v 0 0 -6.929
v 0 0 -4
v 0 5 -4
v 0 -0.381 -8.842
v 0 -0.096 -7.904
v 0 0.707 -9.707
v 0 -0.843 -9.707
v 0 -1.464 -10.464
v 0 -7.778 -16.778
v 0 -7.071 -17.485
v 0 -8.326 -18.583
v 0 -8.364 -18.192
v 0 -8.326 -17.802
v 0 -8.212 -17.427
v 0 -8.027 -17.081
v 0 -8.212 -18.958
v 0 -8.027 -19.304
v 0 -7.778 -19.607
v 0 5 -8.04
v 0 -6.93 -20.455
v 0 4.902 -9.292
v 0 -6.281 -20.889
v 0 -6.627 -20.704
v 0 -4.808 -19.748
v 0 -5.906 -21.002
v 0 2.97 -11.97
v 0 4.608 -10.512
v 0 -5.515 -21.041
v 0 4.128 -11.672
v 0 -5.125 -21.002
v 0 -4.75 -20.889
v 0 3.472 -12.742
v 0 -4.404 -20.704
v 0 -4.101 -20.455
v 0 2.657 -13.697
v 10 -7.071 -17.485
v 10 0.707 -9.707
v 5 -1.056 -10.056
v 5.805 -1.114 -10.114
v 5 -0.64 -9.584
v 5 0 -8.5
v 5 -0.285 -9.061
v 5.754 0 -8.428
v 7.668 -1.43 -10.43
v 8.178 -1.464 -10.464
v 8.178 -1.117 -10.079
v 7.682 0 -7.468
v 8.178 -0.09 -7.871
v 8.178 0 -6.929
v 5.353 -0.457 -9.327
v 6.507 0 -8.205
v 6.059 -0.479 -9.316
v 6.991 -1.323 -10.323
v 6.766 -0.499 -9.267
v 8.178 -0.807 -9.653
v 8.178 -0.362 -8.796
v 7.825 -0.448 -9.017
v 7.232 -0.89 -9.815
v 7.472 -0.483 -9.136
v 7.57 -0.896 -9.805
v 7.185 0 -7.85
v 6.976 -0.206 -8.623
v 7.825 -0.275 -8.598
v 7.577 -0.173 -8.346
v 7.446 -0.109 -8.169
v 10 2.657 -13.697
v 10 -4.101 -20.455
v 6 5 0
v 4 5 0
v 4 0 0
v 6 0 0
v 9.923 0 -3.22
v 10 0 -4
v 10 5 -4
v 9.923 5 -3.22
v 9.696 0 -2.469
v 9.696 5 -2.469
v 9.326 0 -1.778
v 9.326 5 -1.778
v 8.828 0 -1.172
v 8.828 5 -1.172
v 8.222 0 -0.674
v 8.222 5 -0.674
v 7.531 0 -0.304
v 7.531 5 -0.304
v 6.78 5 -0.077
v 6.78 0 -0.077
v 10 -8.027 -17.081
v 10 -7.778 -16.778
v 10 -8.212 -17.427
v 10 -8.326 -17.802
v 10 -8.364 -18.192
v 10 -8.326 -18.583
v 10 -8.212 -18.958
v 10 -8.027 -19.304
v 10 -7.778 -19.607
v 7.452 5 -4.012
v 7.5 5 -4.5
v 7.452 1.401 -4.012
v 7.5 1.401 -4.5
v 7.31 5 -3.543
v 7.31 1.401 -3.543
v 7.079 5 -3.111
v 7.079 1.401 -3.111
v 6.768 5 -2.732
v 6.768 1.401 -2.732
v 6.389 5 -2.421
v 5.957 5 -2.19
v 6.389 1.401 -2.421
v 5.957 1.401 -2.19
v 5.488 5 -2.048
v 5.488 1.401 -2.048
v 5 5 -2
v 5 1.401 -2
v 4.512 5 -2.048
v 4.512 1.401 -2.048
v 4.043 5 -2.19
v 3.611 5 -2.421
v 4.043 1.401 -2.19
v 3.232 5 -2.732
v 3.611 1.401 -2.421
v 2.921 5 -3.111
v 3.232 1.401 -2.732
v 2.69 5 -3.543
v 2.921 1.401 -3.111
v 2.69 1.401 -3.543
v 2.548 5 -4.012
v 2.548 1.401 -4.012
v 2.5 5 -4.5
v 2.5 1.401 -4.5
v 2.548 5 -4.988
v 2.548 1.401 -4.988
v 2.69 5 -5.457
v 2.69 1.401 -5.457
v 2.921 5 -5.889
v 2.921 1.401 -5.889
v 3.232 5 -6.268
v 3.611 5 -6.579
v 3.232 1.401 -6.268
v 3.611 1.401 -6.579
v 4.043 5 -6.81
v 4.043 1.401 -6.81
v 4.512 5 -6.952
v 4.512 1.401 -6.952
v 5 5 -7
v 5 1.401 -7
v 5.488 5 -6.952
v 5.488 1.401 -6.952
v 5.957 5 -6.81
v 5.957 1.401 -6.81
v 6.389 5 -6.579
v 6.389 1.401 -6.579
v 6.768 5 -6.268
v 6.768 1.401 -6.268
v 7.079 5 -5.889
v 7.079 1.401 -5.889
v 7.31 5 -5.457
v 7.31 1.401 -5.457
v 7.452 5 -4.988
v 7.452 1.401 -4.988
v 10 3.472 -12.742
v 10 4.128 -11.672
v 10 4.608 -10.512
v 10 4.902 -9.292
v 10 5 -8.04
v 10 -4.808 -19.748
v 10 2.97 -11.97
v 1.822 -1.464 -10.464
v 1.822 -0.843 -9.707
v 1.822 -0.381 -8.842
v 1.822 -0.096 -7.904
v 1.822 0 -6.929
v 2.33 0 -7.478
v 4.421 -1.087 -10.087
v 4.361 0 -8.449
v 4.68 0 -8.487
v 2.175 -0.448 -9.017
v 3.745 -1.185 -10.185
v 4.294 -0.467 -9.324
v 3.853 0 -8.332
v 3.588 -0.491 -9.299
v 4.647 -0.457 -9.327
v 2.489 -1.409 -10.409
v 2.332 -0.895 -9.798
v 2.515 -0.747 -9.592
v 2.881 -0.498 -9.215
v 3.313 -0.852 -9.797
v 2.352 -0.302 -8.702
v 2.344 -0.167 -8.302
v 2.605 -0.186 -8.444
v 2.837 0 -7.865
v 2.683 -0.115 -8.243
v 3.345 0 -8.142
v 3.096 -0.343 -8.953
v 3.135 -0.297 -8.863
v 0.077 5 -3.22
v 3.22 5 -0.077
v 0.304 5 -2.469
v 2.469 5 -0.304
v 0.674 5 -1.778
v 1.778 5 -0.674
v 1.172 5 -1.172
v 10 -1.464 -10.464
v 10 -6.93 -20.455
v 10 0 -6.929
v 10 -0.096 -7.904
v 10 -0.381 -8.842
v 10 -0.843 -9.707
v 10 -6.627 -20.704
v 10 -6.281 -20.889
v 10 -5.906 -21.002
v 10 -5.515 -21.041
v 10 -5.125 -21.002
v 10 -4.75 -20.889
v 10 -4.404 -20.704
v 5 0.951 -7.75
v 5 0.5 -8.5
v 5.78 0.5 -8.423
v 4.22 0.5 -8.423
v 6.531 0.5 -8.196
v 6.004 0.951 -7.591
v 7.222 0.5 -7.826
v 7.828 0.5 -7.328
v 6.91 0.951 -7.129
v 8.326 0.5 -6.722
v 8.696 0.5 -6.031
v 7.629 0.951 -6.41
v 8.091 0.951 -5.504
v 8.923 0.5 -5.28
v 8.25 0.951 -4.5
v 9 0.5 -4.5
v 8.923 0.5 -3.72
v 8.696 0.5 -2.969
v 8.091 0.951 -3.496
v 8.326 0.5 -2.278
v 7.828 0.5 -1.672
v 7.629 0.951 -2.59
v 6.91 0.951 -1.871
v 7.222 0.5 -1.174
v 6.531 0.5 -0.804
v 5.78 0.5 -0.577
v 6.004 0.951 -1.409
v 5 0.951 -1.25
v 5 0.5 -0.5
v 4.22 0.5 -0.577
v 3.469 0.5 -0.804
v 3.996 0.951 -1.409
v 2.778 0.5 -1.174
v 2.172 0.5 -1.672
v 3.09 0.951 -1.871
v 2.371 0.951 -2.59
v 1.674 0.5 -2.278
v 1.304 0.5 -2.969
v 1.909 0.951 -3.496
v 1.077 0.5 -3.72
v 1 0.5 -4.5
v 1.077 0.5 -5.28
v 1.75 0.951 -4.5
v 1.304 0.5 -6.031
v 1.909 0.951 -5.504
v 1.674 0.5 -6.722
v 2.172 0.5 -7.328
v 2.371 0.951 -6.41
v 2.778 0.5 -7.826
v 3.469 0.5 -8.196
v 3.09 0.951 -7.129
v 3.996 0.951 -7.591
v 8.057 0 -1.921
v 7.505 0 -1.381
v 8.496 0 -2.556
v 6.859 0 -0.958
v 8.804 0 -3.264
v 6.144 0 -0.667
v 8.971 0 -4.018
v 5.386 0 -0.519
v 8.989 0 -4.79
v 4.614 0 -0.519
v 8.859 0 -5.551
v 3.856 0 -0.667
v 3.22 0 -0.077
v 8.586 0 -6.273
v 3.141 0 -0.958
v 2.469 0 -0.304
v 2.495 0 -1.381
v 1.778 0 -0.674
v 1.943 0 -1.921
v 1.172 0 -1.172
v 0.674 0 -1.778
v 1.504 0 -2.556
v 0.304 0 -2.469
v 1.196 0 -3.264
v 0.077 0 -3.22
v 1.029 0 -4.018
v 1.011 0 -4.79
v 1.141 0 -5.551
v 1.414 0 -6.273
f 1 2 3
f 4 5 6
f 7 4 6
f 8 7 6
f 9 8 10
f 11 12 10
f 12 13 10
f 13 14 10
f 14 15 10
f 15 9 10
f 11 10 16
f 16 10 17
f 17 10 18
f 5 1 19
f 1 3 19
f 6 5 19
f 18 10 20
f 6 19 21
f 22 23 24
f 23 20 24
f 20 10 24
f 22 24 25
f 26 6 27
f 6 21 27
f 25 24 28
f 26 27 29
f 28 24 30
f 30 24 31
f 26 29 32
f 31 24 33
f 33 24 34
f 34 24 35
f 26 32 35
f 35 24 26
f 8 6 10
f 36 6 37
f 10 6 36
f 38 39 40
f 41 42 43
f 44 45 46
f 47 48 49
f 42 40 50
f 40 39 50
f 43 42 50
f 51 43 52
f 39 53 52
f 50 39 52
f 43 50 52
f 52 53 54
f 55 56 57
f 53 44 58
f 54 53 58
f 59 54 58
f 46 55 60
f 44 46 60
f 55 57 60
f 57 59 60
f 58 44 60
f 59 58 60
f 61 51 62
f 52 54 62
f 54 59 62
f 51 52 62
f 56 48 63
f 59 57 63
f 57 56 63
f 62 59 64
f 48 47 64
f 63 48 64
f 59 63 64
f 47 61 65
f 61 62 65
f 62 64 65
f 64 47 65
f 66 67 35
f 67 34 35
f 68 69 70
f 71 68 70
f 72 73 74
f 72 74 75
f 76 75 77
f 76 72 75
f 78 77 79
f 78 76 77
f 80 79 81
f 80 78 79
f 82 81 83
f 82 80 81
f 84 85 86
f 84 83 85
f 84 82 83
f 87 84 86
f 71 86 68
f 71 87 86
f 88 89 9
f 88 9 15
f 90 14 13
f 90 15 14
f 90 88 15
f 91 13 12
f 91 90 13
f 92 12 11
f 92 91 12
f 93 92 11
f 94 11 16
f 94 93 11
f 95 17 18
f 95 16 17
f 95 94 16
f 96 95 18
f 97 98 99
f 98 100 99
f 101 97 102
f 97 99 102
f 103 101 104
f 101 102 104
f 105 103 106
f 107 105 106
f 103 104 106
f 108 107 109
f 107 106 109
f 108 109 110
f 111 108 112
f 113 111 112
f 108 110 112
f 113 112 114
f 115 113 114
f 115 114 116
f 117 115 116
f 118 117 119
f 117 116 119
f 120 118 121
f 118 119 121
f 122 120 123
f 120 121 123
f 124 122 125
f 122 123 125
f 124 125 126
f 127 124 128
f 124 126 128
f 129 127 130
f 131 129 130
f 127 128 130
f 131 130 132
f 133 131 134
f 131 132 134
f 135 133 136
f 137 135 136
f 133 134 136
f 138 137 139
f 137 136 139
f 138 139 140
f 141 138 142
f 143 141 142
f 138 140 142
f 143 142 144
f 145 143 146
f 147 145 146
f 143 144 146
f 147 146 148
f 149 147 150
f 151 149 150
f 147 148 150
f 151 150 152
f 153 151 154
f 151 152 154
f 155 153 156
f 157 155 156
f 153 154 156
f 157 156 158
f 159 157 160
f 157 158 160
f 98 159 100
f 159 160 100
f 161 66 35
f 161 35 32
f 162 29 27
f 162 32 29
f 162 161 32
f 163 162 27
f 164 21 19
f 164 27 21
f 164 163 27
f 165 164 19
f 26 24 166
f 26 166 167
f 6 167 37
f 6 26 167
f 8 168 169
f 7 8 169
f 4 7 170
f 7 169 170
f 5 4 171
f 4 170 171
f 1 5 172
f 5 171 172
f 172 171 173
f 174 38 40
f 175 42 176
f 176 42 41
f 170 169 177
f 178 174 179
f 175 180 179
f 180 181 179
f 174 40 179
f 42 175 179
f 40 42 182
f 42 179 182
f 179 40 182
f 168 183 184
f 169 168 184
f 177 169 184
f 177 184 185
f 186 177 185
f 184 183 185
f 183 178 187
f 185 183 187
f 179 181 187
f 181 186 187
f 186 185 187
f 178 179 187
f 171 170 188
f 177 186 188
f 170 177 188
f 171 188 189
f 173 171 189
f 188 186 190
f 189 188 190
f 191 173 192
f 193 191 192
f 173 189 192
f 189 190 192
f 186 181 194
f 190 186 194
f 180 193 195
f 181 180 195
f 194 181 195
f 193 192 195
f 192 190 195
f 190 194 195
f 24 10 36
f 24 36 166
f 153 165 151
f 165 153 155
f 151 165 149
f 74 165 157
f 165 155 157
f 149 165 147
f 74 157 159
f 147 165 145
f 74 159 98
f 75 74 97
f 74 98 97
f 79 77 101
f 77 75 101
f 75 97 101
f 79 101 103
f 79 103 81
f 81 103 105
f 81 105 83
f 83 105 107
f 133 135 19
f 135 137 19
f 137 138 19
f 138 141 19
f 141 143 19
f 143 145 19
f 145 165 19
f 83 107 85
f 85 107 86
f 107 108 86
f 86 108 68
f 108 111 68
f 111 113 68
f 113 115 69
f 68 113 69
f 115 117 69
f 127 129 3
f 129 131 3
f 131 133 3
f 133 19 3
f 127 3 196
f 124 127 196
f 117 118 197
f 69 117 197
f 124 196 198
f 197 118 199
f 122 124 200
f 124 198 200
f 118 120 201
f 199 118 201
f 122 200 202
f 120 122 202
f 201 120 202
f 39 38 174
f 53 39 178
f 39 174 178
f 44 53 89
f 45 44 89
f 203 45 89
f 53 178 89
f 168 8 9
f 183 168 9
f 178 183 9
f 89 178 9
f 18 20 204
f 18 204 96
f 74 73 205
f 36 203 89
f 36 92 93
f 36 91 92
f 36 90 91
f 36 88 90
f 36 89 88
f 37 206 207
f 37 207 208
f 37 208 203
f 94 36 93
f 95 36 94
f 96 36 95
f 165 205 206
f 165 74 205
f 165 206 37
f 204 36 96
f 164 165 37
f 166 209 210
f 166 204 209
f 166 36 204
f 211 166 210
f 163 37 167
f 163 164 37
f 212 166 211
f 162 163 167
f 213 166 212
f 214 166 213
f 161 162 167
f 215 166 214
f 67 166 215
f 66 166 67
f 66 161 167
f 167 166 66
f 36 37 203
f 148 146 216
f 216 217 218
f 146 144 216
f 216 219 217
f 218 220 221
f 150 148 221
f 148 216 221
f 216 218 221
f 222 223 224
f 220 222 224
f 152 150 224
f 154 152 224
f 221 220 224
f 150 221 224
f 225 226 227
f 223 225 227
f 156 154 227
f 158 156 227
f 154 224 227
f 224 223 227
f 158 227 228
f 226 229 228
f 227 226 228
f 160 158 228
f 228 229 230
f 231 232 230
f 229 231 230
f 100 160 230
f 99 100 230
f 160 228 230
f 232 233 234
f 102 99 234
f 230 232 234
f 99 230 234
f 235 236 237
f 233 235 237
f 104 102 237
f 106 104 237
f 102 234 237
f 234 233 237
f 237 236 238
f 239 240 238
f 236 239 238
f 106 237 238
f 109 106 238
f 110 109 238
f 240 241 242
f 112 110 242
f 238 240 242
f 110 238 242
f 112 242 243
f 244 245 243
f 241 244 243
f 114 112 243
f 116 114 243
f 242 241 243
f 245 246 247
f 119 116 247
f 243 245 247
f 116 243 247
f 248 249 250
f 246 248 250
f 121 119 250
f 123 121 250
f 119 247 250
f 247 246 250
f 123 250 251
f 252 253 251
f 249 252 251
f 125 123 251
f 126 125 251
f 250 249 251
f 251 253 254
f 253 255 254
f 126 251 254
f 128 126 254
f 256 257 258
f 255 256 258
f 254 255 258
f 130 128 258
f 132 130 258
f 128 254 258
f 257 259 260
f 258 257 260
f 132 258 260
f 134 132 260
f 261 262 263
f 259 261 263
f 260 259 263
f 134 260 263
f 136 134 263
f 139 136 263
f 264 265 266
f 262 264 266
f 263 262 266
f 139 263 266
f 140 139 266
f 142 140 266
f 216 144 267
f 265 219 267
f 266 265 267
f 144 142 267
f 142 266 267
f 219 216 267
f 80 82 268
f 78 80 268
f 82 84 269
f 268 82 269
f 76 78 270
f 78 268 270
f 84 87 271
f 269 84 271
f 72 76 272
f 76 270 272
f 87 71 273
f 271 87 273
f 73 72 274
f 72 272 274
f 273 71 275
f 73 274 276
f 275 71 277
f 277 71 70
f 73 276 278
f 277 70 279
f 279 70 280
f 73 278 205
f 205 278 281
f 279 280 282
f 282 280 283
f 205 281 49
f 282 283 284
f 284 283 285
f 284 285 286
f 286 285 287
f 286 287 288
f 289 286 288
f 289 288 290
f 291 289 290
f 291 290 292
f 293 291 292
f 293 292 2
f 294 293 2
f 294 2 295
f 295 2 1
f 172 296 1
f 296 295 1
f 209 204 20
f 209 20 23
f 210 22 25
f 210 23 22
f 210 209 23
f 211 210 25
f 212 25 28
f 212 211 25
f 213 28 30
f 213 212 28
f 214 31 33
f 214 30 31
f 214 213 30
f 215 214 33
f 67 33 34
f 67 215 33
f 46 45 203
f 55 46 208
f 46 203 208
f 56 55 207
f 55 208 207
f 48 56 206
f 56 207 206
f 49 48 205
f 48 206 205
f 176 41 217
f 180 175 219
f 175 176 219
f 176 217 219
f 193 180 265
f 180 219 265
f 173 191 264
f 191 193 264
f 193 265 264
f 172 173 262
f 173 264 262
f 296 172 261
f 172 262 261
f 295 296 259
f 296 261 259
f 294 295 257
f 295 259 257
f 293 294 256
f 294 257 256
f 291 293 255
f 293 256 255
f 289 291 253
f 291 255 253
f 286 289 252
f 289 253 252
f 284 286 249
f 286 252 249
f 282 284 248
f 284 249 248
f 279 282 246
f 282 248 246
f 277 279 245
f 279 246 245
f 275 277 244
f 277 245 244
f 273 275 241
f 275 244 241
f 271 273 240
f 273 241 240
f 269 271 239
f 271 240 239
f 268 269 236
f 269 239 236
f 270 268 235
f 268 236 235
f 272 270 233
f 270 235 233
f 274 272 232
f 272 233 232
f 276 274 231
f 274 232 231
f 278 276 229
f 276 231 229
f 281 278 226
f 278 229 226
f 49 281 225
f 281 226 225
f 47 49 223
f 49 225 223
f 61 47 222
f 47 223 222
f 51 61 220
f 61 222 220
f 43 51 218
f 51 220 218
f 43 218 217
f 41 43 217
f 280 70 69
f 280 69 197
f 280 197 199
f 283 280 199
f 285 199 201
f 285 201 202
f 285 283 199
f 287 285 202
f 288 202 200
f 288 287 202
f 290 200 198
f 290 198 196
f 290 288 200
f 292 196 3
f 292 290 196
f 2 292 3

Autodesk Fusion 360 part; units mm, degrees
sketch "Sketch1" plane through (0, 0, 0) normal (1, 0, 0) x (0, 0, -1)
  line L0 (0, 0) -> (9, 0)
  line L1 (9, 0) -> (9, 5)
  line L2 (9, 5) -> (0, 5)
  line L3 (0, 5) -> (0, 0)
  line L4 (9, 0) -> (16.7782, -7.7782)
  line L5 (9, 0) -> (10, 0) construction
  line L6 (16.7782, -7.7782) -> (17.4853, -7.0711)
  line L7 (9, 0) -> (9.7071, 0.7071)
  line L8 (9.7071, 0.7071) -> (17.4853, -7.0711)
  line L9 (17.4853, -7.0711) -> (19.748, -4.8083)
  line L10 (16.7782, -7.7782) -> (18.1924, -9.1924)
  line L11 (19.748, -4.8083) -> (20.4551, -4.1012)
  line L12 (20.4551, -4.1012) -> (21.8693, -5.5154)
  line L13 (21.8693, -5.5154) -> (18.1924, -9.1924)
  line L14 (19.748, -4.8083) -> (11.9698, 2.9698)
  line L15 (11.9698, 2.9698) -> (9.7071, 0.7071)
  line L16 (20.4551, -4.1012) -> (11.3539, 5)
  line L17 (11.3539, 5) -> (9, 5)
  dimension "d1" = 9
  dimension "d2" = 5
  dimension "d3" = 45
  dimension "d4" = 11
  dimension "d5" = 1
  dimension "d6" = 1
  dimension "d7" = 3.2
  dimension "d8" = 2
  dimension "d9" = 1
  dimension "d10" = 2
extrude "Extrude1" add sketch "Sketch1" along normal blind 10 contours L0 L1 L2 L3 | L4 L6 L7 L8 | L1 L7 L11 L14 L15 L16 L17 | L6 L9 L10 L11 L12 L13
sketch "Sketch2" plane through (0, 0, 0) normal (0, -1, 0) x (1, 0, 0)
  line L0 (0, 0) -> (0, -9)
  line L1 (0, -9) -> (10, -9)
  line L2 (10, -9) -> (10, 0)
  line L3 (10, 0) -> (0, 0)
  circle A0 centre (5, -4.5) radius 2.5
  line L4 (0, -4.5) -> (5, -4.5)
  dimension "d13" = 5
extrude "Extrude2" cut sketch "Sketch2" against normal blind 5 contours A0
hole "Hole1" at (5, 0, -4.5) direction (0, 1, 0) diameter 8 depth 0.5 tip angle 118
fillet "Fillet1" radius 4 2 edges at (10, 2.5, 0) (0, 2.5, 0)
fillet "Fillet2" radius 5 1 edges at (5, 0, -9)
fillet "Fillet3" radius 8 1 edges at (5, 5, -11.3539)
fillet "Fillet4" radius 2 2 edges at (5, -9.1924, -18.1924) (5, -5.5154, -21.8693)
